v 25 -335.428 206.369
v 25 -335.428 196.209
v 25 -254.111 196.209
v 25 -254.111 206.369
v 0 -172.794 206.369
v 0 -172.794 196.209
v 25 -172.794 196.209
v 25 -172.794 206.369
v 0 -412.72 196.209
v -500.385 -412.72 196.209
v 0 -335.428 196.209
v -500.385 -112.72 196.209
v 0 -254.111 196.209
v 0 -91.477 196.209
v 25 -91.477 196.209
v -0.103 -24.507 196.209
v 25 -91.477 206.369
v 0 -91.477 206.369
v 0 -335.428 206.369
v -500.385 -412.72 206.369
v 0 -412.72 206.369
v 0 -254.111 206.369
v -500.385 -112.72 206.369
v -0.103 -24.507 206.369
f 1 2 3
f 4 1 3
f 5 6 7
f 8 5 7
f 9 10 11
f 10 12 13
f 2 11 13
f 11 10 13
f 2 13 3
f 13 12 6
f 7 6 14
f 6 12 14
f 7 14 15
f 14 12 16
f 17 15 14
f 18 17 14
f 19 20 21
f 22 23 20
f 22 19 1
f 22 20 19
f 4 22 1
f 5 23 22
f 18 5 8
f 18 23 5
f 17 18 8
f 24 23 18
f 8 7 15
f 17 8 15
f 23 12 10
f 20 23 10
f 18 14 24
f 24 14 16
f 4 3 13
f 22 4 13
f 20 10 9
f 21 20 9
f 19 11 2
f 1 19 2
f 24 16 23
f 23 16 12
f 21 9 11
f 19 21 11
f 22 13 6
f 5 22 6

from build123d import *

# Parameters (mm, degrees)
BOSS_EXTRUDE1_START = 196.208778
BOSS_EXTRUDE1_DEPTH = 10.16


with BuildPart() as part:
    # Sketch1 → Boss-Extrude1 (new body)
    with BuildSketch(Plane.XY.offset(BOSS_EXTRUDE1_START)):
        Polygon((-0.102720764, -24.506851212), (-500.385059294, -112.720125467), (-500.385059294, -412.720125467), (0, -412.720125467), (0, -335.42775434), (25, -335.42775434), (25, -254.110815755), (0, -254.110815755), (0, -172.79387717), (25, -172.79387717), (25, -91.476938585), (0, -91.476938585), align=None)
    extrude(amount=BOSS_EXTRUDE1_DEPTH)


solid = part.part
